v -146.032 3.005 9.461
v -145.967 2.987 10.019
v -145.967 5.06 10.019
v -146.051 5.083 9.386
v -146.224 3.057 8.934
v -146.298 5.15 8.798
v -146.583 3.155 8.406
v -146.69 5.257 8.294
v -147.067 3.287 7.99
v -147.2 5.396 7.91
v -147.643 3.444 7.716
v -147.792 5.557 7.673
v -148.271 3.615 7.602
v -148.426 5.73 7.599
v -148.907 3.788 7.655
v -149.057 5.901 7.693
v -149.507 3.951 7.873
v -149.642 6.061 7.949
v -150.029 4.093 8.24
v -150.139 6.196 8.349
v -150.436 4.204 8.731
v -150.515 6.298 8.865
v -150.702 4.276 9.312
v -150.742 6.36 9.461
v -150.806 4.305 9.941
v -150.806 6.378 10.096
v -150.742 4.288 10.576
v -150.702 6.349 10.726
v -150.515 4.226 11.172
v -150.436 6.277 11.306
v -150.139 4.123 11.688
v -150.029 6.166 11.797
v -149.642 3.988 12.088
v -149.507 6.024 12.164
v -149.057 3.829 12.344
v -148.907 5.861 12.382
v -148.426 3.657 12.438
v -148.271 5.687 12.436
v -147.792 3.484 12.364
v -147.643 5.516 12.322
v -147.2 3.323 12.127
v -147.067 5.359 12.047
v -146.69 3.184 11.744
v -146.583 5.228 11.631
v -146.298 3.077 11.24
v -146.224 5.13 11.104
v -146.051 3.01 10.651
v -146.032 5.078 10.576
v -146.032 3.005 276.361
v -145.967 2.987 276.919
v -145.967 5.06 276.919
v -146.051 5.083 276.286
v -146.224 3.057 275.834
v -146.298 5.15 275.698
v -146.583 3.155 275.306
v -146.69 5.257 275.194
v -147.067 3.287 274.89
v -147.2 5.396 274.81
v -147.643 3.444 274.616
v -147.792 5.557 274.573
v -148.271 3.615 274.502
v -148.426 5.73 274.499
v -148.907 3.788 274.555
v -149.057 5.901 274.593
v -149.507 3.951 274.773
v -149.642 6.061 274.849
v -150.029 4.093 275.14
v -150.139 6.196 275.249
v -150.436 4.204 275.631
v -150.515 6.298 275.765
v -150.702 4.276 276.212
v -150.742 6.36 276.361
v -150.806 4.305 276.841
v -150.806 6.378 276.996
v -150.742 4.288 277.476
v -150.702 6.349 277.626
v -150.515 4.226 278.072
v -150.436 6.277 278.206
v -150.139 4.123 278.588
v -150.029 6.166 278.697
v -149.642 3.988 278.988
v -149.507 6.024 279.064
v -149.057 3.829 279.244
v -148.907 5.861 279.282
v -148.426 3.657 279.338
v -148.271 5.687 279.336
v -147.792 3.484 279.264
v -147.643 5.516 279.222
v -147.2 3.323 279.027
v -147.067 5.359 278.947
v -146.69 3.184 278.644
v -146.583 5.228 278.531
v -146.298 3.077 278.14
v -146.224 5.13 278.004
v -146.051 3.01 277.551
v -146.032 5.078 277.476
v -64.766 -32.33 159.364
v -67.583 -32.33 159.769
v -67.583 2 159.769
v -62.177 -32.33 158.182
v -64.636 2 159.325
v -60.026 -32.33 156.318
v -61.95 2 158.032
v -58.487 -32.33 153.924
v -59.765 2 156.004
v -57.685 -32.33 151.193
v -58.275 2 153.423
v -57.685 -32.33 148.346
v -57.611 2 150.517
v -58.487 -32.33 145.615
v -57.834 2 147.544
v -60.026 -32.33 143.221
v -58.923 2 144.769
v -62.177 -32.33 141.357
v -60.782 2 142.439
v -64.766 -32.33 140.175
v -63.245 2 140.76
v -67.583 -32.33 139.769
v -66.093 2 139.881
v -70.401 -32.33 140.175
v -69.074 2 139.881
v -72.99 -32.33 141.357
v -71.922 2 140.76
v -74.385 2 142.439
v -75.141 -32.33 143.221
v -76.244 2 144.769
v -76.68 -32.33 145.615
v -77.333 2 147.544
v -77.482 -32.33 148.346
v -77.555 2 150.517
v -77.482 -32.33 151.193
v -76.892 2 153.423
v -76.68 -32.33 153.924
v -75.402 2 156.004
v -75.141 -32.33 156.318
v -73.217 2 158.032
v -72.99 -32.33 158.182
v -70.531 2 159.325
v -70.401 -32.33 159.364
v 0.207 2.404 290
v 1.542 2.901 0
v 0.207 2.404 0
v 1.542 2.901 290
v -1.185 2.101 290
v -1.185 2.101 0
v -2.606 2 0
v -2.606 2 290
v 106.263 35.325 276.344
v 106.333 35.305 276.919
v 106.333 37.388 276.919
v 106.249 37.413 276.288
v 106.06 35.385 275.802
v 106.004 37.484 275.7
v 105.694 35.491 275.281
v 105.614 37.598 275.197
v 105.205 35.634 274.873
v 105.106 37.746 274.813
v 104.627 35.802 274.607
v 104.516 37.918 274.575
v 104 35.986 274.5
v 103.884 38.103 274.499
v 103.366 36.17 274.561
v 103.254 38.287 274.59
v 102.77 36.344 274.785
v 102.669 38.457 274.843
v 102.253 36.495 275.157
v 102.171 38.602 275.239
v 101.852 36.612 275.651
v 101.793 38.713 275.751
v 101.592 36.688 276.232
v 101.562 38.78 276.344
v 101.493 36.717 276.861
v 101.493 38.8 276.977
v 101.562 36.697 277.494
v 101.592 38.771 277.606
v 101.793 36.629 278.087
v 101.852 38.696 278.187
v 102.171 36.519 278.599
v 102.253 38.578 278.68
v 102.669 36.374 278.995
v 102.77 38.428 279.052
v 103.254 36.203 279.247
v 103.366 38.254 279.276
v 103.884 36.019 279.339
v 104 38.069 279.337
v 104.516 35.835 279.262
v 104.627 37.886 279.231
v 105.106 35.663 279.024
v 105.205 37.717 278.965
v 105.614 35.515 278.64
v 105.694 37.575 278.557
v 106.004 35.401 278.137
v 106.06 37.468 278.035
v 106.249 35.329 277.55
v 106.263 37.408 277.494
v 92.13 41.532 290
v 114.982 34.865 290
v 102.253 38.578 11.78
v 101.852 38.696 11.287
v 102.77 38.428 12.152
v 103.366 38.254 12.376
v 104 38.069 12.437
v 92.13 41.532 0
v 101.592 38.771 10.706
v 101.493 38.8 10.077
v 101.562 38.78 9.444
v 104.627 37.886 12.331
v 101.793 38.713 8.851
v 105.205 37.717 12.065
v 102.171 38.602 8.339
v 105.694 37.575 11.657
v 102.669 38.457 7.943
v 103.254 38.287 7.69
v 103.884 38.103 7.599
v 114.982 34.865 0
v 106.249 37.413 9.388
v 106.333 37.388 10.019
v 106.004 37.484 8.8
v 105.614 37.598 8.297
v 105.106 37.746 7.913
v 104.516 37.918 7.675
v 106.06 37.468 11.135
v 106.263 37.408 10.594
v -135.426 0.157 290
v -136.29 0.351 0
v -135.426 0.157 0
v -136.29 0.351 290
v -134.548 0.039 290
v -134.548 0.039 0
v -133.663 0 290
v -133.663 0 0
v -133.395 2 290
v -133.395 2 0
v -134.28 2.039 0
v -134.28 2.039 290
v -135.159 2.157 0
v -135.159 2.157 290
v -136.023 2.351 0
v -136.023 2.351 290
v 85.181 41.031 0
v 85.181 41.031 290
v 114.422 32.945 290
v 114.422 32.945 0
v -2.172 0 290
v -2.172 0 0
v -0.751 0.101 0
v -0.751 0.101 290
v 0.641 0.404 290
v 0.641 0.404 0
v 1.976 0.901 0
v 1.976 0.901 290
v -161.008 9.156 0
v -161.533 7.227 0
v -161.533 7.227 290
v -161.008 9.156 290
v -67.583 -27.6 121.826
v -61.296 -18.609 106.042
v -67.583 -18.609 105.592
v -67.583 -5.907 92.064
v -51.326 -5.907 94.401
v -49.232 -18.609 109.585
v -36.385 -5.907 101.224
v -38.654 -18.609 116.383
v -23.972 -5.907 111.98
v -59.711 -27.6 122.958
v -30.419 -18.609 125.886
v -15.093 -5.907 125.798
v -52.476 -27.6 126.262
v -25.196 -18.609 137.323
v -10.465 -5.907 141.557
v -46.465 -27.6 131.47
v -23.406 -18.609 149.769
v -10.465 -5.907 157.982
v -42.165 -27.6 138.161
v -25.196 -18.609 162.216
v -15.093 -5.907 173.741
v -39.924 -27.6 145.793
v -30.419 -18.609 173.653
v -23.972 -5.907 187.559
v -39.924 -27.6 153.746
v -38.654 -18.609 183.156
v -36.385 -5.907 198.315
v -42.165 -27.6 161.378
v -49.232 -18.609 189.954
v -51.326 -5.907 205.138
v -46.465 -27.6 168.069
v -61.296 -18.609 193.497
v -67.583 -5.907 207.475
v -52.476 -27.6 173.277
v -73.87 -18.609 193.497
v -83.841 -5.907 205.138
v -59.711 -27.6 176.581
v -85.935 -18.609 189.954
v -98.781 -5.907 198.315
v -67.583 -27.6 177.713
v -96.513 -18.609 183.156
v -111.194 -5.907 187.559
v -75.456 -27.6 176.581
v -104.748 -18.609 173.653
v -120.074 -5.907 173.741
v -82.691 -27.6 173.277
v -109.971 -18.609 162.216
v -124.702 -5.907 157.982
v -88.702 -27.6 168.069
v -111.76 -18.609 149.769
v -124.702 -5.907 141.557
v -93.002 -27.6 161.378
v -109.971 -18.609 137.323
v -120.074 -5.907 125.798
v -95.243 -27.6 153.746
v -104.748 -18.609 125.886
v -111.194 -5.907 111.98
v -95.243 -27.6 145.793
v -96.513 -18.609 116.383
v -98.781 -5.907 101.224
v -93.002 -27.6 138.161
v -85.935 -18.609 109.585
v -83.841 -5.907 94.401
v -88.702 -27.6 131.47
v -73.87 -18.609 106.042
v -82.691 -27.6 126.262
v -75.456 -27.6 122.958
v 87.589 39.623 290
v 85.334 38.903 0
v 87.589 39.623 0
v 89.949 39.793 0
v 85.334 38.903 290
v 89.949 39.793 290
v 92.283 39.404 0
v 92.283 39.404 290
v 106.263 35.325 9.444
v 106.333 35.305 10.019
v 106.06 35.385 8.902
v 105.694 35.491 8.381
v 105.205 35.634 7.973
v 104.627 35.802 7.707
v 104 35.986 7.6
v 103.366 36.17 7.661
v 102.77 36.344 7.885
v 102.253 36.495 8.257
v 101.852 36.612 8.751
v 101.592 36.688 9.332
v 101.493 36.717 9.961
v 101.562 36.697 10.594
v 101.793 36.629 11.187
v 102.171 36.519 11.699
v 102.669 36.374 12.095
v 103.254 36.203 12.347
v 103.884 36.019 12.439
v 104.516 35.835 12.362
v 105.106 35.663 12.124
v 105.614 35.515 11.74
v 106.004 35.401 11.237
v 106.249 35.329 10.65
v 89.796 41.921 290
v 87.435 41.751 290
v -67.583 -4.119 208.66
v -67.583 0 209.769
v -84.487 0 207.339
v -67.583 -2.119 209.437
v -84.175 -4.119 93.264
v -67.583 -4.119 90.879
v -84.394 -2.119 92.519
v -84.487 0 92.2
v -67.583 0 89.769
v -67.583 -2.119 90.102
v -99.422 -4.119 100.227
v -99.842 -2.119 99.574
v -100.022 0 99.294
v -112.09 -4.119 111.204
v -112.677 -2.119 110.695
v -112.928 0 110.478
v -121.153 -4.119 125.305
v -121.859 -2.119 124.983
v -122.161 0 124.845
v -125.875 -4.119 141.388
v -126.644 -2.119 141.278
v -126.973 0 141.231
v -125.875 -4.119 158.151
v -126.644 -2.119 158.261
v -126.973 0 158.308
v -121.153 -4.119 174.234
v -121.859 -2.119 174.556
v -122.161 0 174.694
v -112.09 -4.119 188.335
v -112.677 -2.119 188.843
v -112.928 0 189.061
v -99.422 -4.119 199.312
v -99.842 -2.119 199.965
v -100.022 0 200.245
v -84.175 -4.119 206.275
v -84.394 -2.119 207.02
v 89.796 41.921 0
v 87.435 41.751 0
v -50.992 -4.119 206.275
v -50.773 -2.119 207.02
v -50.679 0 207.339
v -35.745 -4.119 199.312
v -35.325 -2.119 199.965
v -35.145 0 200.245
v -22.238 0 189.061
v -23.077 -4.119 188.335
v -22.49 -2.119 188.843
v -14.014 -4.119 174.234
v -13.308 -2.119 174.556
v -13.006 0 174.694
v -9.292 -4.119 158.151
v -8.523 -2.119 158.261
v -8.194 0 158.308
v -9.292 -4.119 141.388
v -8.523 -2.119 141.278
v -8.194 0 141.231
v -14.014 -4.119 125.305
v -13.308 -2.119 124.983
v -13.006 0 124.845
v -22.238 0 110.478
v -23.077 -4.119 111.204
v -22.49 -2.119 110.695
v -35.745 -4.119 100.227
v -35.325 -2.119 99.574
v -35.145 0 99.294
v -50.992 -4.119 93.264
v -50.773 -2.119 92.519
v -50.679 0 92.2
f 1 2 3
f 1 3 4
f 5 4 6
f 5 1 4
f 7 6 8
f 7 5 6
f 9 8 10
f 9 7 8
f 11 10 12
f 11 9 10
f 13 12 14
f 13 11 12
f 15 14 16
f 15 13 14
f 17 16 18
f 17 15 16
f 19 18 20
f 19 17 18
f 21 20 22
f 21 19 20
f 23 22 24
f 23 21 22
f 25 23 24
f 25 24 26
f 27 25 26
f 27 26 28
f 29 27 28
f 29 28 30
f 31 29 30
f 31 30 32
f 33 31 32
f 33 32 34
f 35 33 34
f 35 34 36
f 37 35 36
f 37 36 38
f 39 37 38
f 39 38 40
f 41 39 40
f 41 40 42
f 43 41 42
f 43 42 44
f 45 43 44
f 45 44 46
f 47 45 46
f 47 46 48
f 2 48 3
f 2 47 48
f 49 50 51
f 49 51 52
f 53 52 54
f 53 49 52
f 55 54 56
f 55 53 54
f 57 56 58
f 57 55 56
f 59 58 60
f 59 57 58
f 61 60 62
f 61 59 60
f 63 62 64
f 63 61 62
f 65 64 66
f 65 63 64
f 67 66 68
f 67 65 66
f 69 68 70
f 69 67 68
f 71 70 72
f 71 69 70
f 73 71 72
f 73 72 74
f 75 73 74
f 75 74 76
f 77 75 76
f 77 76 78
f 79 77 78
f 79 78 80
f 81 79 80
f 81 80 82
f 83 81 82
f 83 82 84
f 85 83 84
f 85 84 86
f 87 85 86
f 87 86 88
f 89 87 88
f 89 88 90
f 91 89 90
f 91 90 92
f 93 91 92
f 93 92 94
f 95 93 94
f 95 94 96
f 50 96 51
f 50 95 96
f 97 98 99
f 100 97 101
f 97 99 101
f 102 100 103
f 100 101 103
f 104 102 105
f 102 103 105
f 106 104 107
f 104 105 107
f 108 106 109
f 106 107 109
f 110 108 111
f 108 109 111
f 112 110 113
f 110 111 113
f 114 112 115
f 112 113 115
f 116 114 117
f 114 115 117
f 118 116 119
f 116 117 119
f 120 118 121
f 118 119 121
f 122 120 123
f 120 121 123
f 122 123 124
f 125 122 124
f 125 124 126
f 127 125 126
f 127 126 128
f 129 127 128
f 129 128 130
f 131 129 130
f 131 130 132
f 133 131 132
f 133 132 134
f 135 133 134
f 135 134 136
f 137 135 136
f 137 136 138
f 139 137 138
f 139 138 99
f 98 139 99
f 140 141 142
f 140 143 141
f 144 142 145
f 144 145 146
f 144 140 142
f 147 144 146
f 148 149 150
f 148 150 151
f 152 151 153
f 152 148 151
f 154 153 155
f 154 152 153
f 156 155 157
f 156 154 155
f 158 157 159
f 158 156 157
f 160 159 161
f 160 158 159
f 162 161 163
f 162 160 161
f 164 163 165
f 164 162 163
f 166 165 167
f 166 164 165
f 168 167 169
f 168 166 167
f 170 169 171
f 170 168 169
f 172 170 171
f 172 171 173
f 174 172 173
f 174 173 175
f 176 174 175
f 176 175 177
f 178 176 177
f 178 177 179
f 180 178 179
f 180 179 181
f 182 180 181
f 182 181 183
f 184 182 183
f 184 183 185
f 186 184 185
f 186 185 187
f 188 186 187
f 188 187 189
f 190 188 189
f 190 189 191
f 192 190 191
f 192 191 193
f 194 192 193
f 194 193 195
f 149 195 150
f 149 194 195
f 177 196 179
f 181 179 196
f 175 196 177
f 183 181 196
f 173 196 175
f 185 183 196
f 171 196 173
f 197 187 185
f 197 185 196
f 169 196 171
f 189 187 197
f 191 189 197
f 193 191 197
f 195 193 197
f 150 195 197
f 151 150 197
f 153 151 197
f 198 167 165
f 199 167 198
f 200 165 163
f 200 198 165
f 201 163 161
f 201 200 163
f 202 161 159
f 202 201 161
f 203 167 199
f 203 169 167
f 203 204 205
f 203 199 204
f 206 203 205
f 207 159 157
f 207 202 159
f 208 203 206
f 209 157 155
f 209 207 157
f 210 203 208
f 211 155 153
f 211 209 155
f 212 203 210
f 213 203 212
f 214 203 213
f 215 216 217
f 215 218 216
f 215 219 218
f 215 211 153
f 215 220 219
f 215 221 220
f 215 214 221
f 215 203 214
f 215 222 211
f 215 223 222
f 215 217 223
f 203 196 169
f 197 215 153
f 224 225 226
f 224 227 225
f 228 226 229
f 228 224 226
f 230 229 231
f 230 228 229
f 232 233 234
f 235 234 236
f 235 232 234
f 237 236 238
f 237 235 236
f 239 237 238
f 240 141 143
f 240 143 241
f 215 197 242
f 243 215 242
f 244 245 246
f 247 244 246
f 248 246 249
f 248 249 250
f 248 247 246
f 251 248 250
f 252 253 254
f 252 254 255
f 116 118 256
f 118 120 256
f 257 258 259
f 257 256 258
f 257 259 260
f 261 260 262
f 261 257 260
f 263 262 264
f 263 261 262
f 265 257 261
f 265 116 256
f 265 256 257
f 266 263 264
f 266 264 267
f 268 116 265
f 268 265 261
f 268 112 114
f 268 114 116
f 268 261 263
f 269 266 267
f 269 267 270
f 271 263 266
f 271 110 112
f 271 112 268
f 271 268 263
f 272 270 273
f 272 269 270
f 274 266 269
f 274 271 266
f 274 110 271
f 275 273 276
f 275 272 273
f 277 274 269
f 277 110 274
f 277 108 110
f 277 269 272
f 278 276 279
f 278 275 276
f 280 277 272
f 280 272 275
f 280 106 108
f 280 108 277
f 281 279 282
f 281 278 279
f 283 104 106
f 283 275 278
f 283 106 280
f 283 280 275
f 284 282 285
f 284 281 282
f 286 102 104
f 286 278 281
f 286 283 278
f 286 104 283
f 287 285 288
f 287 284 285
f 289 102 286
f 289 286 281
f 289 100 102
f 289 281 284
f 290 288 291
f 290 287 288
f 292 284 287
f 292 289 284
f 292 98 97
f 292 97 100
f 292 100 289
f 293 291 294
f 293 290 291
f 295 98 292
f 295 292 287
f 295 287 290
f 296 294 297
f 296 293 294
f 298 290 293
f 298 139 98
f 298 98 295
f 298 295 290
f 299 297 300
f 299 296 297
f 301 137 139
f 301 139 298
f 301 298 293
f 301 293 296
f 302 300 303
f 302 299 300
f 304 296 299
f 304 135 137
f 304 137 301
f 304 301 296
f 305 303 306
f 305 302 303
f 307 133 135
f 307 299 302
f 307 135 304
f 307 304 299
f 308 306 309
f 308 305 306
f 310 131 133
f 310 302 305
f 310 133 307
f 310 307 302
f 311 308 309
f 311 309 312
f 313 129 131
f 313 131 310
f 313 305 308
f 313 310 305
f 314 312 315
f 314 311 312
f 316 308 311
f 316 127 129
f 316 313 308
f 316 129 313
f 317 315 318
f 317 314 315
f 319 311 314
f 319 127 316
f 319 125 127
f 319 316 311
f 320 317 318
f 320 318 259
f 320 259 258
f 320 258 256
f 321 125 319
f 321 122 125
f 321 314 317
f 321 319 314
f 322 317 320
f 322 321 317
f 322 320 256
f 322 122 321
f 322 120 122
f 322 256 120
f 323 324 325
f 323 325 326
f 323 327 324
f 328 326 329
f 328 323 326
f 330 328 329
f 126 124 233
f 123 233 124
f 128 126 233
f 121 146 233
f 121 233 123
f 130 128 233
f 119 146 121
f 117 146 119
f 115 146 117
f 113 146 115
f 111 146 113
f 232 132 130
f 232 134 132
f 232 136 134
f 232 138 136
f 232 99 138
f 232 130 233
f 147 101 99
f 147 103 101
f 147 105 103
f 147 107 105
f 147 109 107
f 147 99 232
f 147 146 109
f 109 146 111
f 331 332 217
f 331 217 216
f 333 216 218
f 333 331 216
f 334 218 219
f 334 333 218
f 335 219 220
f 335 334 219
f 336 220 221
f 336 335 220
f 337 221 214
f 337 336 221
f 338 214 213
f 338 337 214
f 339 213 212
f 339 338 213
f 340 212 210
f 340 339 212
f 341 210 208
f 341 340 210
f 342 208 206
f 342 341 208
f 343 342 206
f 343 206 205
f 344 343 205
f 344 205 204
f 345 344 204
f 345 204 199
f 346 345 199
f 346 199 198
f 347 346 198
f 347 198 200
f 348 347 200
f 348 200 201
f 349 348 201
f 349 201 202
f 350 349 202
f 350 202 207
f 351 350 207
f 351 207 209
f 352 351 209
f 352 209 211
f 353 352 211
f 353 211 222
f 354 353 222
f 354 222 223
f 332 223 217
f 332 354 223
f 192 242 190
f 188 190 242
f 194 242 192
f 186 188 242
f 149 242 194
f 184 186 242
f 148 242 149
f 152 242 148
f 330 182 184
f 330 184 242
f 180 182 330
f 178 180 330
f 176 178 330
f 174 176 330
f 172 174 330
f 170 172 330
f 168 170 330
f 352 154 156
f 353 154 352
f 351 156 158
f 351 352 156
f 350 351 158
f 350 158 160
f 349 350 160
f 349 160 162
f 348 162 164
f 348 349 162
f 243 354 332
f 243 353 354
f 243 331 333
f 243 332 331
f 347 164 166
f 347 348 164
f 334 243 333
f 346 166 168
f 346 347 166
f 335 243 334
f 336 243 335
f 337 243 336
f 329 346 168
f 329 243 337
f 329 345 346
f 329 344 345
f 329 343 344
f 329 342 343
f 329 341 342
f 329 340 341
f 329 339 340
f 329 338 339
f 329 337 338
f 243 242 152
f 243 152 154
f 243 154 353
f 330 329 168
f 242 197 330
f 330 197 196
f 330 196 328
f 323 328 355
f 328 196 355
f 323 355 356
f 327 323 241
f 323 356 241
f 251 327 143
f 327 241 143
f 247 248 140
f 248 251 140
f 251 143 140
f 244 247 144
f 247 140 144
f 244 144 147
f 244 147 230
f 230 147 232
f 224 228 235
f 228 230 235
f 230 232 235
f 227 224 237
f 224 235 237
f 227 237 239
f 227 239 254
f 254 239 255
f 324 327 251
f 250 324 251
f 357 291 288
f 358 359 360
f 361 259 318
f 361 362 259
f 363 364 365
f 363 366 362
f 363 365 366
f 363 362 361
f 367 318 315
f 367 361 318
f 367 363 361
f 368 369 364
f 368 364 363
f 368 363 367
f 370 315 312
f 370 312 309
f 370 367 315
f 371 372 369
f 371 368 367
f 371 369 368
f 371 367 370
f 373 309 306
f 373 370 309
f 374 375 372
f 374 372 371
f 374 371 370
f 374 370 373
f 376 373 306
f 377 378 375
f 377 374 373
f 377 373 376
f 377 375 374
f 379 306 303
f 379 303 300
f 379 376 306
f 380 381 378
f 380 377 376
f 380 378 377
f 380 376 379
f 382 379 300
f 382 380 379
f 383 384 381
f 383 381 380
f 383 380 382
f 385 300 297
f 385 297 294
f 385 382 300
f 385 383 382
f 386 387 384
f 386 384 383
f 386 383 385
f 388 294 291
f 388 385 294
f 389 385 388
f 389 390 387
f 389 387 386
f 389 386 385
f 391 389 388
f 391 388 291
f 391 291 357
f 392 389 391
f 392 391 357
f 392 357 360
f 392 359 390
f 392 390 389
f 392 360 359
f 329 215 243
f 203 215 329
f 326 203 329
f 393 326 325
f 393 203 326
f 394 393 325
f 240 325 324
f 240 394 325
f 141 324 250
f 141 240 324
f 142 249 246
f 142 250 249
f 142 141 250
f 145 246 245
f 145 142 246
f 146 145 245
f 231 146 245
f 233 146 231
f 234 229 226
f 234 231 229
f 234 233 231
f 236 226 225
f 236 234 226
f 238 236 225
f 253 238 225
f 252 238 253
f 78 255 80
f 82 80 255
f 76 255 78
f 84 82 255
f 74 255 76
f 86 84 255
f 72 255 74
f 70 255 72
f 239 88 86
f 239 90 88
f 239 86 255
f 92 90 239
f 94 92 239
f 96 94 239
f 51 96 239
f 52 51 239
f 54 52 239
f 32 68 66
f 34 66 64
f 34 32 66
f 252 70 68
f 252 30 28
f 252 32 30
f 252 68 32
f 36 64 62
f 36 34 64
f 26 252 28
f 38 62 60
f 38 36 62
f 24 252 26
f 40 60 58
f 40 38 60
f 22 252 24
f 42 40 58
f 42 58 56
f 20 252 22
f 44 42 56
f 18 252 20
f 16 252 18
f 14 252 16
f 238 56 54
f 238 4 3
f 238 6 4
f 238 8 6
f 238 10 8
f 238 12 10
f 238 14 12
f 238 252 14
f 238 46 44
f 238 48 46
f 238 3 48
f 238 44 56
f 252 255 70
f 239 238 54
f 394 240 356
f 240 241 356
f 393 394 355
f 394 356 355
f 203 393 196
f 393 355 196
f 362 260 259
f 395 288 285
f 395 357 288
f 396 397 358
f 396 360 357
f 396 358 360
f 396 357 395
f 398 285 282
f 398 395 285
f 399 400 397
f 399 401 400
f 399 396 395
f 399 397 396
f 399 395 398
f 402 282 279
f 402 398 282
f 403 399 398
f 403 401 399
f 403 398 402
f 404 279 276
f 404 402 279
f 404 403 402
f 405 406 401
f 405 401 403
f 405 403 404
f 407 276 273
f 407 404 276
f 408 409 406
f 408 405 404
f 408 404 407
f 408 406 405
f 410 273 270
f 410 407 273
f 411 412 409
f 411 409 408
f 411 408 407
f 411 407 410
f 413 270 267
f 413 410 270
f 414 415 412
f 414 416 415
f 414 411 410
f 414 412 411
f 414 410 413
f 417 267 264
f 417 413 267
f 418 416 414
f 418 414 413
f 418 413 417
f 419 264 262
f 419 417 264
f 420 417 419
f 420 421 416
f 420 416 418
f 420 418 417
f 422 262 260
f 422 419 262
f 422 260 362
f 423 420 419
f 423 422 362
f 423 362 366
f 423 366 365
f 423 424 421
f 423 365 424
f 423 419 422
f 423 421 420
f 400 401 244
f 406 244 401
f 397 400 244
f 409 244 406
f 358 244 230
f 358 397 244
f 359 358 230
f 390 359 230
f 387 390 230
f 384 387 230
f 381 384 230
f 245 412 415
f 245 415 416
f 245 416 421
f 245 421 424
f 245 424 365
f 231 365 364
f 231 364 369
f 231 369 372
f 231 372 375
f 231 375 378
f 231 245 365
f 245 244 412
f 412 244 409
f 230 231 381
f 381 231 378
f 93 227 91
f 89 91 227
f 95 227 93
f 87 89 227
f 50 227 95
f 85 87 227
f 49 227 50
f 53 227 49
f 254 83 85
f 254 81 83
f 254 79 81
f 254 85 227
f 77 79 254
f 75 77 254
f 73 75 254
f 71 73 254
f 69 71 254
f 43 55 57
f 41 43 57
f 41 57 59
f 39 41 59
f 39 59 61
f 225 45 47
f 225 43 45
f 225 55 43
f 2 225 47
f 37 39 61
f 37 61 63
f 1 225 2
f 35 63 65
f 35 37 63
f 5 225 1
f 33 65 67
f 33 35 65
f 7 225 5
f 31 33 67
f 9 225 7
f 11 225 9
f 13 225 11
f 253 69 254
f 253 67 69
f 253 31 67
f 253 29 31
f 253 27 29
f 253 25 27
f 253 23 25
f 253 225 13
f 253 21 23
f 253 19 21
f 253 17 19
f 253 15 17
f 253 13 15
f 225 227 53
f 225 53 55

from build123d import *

# Parameters (mm, degrees)
BOSS_EXTRUDE1_DEPTH = 290
SKETCH2_R           = 60
BOSS_EXTRUDE2_DEPTH = 5
DOME1_FACE_RADIUS   = 60
DOME1_HEIGHT        = 30
FILLET1_R           = 10
SKETCH3_R           = 10
CUT_EXTRUDE1_DEPTH  = 335.423734017
FILLET2_R           = 10
FILLET3_R           = 10
SKETCH8_R           = 2.42
SKETCH8_R_2         = 2.420000001
CUT_EXTRUDE2_DEPTH  = 40


with BuildPart() as part:
    # Sketch1 → Boss-Extrude1 (new body)
    with BuildSketch(Plane.XY):
        Polygon((0, 0), (-135, 0), (-161.533498532, 7.226579802), (-161.007929092, 9.156288786), (-134.732514829, 2), (-0.434386742, 2), (88.562311317, 42.572930951), (114.981959712, 34.864758374), (114.421796177, 32.944806079), (88.715656235, 40.444806079), align=None)
    extrude(amount=BOSS_EXTRUDE1_DEPTH)

    # Sketch2 → Boss-Extrude2 (add)
    with BuildSketch(Plane(origin=(0, 2, 0), x_dir=(1, 0, 0), z_dir=(0, 1, 0))):
        with Locations(Location((-67.583450785, -149.769450313, 0), (0, 0, 270))):
            Circle(SKETCH2_R)
    extrude(amount=-BOSS_EXTRUDE2_DEPTH)

    # Dome1: a dome of height H over a round flat face of radius A is a cap of a sphere of radius (A * A + H * H) / (2 * H)
    dome1_r = (DOME1_FACE_RADIUS * DOME1_FACE_RADIUS + DOME1_HEIGHT * DOME1_HEIGHT) / (2 * DOME1_HEIGHT)
    dome1_base = Plane((-67.583450785, -3, 149.769450313), z_dir=(0, -1, 0))
    with Locations(dome1_base.offset(DOME1_HEIGHT - dome1_r)):
        dome1_ball = Sphere(dome1_r, mode=Mode.PRIVATE)
    add(split(dome1_ball, bisect_by=dome1_base, keep=Keep.TOP, mode=Mode.PRIVATE))

    # Fillet1
    # the kernel refuses this fillet: 10 mm, written as the material it takes off along each edge
    with BuildSketch(Plane(origin=(-67.583450785, -3, 149.769450313), x_dir=(4.089410291877963e-12, 0, -1.0), z_dir=(1.0, 0, 4.089410291877963e-12))) as fillet1_piece_1:
        with BuildLine():
            CenterArc((50.011565498, 3.480807854), FILLET1_R, 320.300820282, 36.943291115)
            Line((57.705652497, -2.906760168), (57.859534237, -3.034511529))
            ThreePointArc((57.859534237, -3.034511529), (59.02775796, -1.591456193), (60.16, -0.12))
            Line((60.16, -0.12), (60.2, 0))
            ThreePointArc((60.2, 0), (60.2, 1.5), (60.19976869, 2.990383843))
            Line((60.19976869, 2.990383843), (60, 3))
        make_face()
    revolve(axis=Axis((-67.583450785, -3, 149.769450313), (0, 1, 0)), revolution_arc=180, mode=Mode.SUBTRACT)
    with BuildSketch(Plane(origin=(-67.583450785, -3, 149.769450313), x_dir=(0, 0, 1), z_dir=(-1, 0, 0))) as fillet1_piece_2:
        with BuildLine():
            CenterArc((50.011565498, 3.480807853), FILLET1_R, 320.300820281, 36.94329112)
            Line((57.705652497, -2.906760169), (57.859534237, -3.03451153))
            ThreePointArc((57.859534237, -3.03451153), (59.02775796, -1.591456194), (60.16, -0.12))
            Line((60.16, -0.12), (60.2, 0))
            ThreePointArc((60.2, 0), (60.2, 1.5), (60.19976869, 2.990383843))
            Line((60.19976869, 2.990383843), (60, 3))
        make_face()
    revolve(axis=Axis((-67.583450785, -3, 149.769450313), (0, 1, 0)), revolution_arc=180, mode=Mode.SUBTRACT)

    # Sketch3 → Cut-Extrude1 (cut, through all)
    with BuildSketch(Plane(origin=(0, 2, 0), x_dir=(1, 0, 0), z_dir=(0, 1, 0))):
        with Locations(Location((-67.583450785, -149.769450313, 0), (0, 0, 270))):
            Circle(SKETCH3_R)
    extrude(amount=-CUT_EXTRUDE1_DEPTH, mode=Mode.SUBTRACT)

    # Fillet2
    fillet2_edges = [part.edges().sort_by_distance(p)[0] for p in [
        (88.562311317, 42.572930951, 145),
        (88.715656235, 40.444806079, 145),
    ]]
    fillet(fillet2_edges, radius=FILLET2_R)

    # Fillet3
    fillet3_edges = [part.edges().sort_by_distance(p)[0] for p in [
        (0, 0, 145),
        (-135, 0, 145),
        (-134.732514829, 2, 145),
        (-0.434386742, 2, 145),
    ]]
    fillet(fillet3_edges, radius=FILLET3_R)

    # Sketch8 → Cut-Extrude2 (cut)
    with BuildSketch(Plane(origin=(0, 0, 0), x_dir=(1, 0, 0), z_dir=(0, 1, 0))):
        with Locations((-148.387339129, -10.01871293)):
            Circle(SKETCH8_R)
        with Locations((103.912660871, -10.01871293)):
            Circle(SKETCH8_R)
        with Locations((103.912660871, -276.91871293)):
            Circle(SKETCH8_R)
        with Locations((-148.387339129, -276.91871293)):
            Circle(SKETCH8_R_2)
    extrude(amount=CUT_EXTRUDE2_DEPTH, mode=Mode.SUBTRACT)


solid = part.part
